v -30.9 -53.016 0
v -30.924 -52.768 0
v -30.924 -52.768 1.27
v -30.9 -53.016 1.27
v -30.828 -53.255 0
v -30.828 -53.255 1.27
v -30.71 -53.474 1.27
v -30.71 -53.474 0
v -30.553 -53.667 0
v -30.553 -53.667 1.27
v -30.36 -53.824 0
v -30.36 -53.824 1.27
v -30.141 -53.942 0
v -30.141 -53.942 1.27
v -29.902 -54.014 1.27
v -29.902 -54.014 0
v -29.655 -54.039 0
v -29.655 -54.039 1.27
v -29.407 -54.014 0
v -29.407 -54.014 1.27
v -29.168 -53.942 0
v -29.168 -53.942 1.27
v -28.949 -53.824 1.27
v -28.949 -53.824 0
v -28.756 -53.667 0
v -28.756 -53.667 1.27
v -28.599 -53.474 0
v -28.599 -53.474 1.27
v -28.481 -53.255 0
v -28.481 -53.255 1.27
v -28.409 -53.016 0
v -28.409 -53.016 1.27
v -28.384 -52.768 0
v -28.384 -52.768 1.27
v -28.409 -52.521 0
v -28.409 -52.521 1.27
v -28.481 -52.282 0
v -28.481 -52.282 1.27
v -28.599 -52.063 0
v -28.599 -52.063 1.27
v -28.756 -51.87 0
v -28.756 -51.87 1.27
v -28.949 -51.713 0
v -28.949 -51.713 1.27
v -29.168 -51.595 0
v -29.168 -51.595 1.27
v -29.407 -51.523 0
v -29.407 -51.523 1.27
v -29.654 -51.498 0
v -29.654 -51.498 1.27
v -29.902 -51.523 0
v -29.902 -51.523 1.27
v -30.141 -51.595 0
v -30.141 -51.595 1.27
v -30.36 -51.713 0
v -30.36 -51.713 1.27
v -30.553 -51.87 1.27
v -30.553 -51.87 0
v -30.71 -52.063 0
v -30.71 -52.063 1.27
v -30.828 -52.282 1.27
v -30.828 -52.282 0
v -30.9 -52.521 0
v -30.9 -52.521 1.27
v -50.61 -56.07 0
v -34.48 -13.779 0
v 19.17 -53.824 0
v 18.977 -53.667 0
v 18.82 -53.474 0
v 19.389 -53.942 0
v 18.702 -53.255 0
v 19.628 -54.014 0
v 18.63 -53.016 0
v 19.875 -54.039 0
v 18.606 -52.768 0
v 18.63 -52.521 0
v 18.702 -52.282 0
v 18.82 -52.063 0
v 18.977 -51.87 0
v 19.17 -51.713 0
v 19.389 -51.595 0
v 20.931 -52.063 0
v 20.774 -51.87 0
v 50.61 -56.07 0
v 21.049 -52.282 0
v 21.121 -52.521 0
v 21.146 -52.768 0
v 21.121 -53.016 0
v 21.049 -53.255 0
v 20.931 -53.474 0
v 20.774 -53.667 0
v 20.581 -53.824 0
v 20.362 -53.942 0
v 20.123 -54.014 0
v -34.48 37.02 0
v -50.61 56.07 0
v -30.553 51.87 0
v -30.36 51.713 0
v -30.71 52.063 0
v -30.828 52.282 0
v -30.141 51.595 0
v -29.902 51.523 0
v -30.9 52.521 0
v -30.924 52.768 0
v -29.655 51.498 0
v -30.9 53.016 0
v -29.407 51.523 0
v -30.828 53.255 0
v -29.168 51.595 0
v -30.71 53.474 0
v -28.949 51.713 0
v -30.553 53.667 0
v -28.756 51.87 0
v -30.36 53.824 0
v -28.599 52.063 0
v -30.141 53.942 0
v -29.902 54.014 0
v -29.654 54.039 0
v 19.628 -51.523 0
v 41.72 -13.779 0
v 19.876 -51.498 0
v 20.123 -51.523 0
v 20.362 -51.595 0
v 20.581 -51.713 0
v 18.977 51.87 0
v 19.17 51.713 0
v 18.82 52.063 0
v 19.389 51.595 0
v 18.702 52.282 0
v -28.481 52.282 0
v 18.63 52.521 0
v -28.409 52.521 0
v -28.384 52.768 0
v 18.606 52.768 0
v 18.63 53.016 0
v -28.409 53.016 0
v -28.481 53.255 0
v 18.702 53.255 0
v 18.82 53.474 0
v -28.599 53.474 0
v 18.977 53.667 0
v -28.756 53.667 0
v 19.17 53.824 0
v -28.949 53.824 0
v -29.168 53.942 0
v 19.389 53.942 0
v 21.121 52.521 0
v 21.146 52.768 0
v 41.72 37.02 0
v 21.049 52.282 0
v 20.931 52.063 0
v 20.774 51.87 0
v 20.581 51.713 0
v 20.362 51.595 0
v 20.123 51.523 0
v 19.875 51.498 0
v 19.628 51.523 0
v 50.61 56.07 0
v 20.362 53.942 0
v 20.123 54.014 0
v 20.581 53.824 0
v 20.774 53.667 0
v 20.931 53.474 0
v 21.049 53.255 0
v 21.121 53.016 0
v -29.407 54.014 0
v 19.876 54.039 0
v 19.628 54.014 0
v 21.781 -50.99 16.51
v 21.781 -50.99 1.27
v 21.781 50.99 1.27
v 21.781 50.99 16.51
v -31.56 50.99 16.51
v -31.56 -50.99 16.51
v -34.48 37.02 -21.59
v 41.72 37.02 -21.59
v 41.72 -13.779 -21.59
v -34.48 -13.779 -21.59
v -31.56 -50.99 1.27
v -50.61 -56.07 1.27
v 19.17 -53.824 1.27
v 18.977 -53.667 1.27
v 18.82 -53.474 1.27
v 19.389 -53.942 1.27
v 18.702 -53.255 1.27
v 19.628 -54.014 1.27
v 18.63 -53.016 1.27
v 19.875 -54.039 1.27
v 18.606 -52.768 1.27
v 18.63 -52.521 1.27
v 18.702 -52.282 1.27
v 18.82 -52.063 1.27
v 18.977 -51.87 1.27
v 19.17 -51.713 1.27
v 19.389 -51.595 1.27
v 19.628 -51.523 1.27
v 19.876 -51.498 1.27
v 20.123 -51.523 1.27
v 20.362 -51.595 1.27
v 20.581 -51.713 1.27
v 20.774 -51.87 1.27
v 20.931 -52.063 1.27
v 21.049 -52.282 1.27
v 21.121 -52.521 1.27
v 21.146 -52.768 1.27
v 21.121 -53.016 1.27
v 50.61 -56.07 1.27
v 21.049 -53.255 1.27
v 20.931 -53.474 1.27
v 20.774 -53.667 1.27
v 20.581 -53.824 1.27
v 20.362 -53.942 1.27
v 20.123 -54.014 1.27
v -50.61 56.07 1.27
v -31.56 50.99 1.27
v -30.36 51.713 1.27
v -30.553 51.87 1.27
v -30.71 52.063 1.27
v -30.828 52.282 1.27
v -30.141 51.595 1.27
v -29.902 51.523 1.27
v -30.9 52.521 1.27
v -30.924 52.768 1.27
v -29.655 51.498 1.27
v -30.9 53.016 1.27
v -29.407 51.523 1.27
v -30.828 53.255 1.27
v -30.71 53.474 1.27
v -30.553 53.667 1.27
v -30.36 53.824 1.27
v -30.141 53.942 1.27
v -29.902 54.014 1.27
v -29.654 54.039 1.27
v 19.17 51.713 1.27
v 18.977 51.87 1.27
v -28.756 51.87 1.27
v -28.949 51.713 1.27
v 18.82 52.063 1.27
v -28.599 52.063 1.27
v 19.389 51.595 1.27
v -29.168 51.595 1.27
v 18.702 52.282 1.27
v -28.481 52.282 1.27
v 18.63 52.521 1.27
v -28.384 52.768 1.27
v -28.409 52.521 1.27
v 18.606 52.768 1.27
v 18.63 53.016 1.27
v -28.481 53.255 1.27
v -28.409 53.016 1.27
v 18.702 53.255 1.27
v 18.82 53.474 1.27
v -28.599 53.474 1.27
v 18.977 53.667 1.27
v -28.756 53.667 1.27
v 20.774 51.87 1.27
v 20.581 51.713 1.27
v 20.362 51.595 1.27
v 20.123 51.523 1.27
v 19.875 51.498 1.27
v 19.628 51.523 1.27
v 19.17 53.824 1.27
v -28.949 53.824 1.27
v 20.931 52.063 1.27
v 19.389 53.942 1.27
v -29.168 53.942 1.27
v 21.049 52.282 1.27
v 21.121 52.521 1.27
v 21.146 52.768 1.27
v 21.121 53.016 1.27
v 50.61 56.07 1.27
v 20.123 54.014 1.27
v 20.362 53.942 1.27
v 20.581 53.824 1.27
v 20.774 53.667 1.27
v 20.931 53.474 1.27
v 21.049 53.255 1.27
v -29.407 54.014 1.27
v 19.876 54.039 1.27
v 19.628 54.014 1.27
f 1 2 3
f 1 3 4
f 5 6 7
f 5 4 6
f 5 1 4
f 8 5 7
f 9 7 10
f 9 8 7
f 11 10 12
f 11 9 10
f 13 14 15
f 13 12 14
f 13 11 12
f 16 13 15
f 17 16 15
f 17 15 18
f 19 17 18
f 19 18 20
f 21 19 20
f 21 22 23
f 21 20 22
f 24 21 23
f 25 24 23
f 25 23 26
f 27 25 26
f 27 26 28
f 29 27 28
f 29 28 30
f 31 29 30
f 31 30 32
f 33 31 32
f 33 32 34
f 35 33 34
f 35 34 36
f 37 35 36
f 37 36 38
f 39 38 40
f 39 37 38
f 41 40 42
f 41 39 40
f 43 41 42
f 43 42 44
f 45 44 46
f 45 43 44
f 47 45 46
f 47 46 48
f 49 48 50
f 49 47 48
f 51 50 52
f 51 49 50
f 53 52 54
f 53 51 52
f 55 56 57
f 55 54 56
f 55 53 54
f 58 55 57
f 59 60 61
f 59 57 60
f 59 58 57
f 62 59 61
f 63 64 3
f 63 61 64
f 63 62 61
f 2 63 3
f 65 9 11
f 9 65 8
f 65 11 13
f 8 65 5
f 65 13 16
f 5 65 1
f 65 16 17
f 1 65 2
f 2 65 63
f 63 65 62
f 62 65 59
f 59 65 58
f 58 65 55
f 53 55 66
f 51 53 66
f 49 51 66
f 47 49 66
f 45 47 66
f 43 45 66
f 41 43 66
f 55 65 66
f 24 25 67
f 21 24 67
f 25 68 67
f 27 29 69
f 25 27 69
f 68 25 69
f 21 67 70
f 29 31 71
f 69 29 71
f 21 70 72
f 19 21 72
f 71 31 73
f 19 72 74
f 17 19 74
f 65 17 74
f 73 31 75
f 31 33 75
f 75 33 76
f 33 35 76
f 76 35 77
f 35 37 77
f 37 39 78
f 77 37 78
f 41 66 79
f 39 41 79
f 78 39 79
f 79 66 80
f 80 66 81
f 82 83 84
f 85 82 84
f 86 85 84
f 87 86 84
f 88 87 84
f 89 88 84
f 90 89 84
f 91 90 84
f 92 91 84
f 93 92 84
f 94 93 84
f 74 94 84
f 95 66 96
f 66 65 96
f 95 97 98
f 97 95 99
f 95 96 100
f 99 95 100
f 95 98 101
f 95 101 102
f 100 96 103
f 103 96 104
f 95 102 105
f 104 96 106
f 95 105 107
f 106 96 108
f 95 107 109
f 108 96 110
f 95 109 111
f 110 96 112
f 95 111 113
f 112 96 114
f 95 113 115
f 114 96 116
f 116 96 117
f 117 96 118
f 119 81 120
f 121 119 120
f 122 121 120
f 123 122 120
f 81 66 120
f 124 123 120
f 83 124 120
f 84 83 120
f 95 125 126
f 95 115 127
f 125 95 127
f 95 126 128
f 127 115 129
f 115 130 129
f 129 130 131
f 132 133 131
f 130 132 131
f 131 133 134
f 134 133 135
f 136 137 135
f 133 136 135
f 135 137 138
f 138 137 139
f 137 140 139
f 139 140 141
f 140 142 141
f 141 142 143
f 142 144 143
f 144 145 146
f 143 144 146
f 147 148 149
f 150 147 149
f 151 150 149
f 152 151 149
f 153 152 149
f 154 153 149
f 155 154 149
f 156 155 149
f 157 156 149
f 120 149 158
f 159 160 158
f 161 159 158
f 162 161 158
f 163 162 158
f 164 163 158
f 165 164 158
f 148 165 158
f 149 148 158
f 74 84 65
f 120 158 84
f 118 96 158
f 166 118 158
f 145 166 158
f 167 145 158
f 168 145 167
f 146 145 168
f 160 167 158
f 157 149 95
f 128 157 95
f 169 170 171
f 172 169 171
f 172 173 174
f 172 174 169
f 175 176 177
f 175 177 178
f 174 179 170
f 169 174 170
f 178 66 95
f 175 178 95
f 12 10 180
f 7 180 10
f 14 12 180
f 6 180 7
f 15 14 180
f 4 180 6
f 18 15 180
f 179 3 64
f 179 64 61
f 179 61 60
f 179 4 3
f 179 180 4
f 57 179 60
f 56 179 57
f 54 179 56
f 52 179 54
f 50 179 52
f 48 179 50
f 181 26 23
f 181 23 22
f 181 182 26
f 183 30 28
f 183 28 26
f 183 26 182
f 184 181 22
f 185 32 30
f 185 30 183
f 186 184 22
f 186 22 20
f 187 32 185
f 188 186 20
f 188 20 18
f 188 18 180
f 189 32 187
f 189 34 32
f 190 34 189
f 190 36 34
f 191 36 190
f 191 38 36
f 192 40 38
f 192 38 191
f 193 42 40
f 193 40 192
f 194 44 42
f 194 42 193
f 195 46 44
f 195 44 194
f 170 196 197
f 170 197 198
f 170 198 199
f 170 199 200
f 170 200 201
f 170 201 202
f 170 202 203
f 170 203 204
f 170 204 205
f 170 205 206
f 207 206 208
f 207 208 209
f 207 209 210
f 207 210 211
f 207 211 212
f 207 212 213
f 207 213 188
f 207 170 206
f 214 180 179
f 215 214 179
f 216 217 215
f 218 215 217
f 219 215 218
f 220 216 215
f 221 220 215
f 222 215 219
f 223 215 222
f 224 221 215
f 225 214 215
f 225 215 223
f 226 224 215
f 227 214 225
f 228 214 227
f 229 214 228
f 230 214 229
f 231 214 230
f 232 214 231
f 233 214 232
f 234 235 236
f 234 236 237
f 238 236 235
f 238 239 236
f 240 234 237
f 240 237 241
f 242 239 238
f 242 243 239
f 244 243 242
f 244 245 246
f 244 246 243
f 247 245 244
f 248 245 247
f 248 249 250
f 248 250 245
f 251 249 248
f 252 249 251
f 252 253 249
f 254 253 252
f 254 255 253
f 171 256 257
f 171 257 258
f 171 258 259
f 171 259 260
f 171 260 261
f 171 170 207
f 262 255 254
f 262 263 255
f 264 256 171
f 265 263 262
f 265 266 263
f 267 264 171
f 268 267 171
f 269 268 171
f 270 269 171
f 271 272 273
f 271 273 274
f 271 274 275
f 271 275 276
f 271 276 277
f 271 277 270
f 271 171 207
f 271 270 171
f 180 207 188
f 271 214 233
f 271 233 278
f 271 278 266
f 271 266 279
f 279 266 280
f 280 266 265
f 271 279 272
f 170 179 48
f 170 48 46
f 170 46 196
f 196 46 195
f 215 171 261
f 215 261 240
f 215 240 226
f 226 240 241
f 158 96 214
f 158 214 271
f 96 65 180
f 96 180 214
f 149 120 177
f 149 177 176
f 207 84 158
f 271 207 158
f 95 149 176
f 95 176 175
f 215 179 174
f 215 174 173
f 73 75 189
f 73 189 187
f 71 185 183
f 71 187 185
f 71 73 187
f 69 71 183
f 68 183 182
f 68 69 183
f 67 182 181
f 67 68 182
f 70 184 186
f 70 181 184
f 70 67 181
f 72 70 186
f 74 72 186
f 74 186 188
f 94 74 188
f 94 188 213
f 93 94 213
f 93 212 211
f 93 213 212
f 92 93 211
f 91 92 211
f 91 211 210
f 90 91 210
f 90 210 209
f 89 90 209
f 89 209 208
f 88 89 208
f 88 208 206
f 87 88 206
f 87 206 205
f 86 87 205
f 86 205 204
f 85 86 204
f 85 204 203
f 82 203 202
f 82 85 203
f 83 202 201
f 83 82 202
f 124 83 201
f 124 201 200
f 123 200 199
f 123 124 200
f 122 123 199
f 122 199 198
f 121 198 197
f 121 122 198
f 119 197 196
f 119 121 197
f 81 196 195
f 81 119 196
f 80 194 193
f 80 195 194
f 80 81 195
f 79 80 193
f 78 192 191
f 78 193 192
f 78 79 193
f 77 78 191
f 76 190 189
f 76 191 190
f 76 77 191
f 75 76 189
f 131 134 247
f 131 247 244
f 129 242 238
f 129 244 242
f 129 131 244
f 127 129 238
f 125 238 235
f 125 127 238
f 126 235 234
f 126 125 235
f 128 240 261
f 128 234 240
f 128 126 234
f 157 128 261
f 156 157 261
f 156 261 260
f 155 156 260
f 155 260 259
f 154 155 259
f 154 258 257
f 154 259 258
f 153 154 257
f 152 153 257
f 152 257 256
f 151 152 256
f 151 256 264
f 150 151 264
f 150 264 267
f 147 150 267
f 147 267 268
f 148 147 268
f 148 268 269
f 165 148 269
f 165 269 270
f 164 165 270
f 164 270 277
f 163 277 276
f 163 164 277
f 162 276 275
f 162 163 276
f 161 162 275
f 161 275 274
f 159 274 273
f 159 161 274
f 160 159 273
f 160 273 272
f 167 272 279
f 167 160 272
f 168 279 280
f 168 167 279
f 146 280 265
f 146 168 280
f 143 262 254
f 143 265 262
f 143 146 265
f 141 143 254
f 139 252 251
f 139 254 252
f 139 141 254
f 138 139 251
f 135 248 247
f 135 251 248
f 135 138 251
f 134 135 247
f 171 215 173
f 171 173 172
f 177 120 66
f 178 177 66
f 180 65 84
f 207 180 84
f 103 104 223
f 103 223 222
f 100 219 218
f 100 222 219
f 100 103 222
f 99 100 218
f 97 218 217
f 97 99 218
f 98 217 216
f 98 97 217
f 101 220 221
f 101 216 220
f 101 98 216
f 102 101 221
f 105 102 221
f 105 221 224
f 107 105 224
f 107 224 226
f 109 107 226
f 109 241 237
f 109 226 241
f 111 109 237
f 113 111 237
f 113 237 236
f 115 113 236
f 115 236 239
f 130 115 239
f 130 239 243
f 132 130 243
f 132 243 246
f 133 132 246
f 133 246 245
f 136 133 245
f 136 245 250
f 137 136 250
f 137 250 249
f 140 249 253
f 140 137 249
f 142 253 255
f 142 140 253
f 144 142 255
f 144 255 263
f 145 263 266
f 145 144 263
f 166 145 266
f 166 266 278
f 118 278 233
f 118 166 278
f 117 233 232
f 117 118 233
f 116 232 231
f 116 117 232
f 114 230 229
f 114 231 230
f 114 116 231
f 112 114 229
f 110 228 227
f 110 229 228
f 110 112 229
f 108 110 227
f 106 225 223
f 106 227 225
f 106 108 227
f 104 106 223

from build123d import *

# Parameters (mm, degrees)
SKETCH1_W               = 101.219
SKETCH1_H               = 112.141
BOSS_EXTRUDE1_DEPTH     = 1.27
SKETCH2_W               = 53.34
SKETCH2_H               = 101.981
BOSS_EXTRUDE2_DEPTH     = 15.24
SKETCH3_W               = 76.2
SKETCH3_H               = 50.8
BOSS_EXTRUDE3_DEPTH     = 21.59
CUT_EXTRUDE1_DEPTH      = 79.916424529
CUT_EXTRUDE1_DEPTH_BACK = 79.916424529
SKETCH4_R               = 1.27


with BuildPart() as part:
    # Sketch1 → Boss-Extrude1 (new body)
    with BuildSketch(Plane.XY):
        Rectangle(SKETCH1_W, SKETCH1_H)
    extrude(amount=BOSS_EXTRUDE1_DEPTH)

    # Sketch2 → Boss-Extrude2 (add)
    with BuildSketch(Plane.XY.offset(1.27)):
        with Locations((-4.8895, 0)):
            Rectangle(SKETCH2_W, SKETCH2_H)
    extrude(amount=BOSS_EXTRUDE2_DEPTH)

    # Sketch3 → Boss-Extrude3 (add)
    with BuildSketch(Plane(origin=(0, 0, 0), x_dir=(-1, 0, 0), z_dir=(0, 0, -1))):
        with Locations((-3.6195, 11.6205)):
            Rectangle(SKETCH3_W, SKETCH3_H)
    extrude(amount=BOSS_EXTRUDE3_DEPTH)

    # Sketch4 → Cut-Extrude1 (cut, two sides: drawn at the far end of the back side and taken through both)
    with BuildSketch(Plane.XY.offset(1.27).offset(-CUT_EXTRUDE1_DEPTH_BACK)):
        with Locations(Location((-29.6545, 52.7685, 0), (0, 0, 180))):
            Circle(SKETCH4_R)
        with Locations(Location((19.8755, 52.7685, 0), (0, 0, 180))):
            Circle(SKETCH4_R)
        with Locations(Location((-29.6545, -52.7685, 0), (0, 0, 180))):
            Circle(SKETCH4_R)
        with Locations(Location((19.8755, -52.7685, 0), (0, 0, 180))):
            Circle(SKETCH4_R)
    extrude(amount=CUT_EXTRUDE1_DEPTH + CUT_EXTRUDE1_DEPTH_BACK, mode=Mode.SUBTRACT)


solid = part.part
